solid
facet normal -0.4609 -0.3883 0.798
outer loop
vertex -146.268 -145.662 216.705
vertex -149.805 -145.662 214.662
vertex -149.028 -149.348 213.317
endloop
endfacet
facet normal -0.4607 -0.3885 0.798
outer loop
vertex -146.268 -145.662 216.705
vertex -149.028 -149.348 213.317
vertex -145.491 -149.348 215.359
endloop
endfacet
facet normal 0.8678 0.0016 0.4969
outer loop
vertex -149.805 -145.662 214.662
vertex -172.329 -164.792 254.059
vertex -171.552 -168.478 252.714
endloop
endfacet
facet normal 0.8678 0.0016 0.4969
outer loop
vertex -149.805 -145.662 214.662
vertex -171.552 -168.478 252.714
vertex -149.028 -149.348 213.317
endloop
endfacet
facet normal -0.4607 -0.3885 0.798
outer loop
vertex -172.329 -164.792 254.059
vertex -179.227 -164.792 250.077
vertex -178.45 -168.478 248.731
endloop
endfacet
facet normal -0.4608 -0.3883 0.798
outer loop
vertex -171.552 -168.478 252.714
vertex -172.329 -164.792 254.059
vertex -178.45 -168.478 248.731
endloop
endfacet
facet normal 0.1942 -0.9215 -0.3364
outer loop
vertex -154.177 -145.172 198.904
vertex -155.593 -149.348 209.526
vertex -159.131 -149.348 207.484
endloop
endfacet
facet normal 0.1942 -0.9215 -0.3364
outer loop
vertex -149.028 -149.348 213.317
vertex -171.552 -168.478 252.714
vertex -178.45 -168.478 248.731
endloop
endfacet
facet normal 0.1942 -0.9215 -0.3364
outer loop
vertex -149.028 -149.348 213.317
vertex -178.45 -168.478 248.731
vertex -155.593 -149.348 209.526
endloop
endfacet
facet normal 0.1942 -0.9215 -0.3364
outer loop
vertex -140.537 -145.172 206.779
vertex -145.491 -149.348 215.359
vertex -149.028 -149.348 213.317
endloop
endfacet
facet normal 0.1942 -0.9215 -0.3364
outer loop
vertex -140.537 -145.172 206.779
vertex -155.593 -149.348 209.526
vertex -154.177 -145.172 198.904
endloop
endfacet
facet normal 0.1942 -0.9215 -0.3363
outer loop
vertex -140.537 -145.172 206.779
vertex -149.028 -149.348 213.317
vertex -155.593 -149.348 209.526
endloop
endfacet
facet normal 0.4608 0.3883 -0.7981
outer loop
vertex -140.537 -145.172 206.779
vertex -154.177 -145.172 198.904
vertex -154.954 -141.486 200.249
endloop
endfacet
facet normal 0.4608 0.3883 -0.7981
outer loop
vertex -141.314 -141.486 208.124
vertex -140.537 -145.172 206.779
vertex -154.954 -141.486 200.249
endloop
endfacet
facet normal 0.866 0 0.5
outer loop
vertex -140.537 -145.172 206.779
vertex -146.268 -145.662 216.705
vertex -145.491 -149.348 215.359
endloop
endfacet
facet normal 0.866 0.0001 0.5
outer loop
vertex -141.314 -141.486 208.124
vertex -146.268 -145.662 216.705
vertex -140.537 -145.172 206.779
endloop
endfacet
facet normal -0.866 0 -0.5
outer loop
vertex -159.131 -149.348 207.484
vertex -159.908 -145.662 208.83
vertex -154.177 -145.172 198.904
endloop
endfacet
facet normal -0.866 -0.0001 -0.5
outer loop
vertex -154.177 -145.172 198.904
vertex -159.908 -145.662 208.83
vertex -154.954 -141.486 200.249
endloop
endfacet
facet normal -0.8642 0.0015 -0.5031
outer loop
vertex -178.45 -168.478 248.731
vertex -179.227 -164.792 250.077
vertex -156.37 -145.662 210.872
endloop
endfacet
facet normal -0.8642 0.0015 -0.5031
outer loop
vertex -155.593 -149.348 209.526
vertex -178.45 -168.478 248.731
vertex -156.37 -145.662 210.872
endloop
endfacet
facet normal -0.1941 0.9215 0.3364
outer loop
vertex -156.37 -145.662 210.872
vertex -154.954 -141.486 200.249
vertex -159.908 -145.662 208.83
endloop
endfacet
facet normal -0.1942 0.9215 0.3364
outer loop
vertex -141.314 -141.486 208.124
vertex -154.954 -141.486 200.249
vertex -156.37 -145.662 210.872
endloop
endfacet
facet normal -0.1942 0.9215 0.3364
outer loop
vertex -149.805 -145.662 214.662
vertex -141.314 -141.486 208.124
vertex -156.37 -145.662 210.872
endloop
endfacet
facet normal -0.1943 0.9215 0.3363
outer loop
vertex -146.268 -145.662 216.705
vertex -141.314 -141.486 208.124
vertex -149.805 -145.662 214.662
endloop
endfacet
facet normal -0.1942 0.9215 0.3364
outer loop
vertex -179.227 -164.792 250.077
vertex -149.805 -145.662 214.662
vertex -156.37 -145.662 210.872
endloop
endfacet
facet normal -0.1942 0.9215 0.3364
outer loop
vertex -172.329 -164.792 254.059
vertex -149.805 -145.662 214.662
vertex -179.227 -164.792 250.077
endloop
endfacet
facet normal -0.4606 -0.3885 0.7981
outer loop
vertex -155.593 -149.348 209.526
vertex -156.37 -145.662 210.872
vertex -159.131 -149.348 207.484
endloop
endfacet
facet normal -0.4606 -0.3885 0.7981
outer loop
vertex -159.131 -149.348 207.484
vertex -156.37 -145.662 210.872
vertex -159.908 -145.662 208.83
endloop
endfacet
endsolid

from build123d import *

# Parameters (mm, degrees)
BOSS_EXTRUDE1_DEPTH = 15.75
CUT_EXTRUDE1_DEPTH  = 29.12540638


with BuildPart() as part:
    # Sketch1 → Boss-Extrude1 (new body)
    with BuildSketch(Plane(origin=(-15.864839006, 0, -9.159569071), x_dir=(0.5, 0, -0.866025404), z_dir=(0.866025404, 0, 0.5))):
        Polygon((-250.897888289, -141.485825414), (-306.1863183, -164.792251717), (-304.632556546, -168.478147051), (-249.344126536, -145.171720748), align=None)
    extrude(amount=-BOSS_EXTRUDE1_DEPTH)

    # Sketch2 → Cut-Extrude1 (cut, through all)
    with BuildSketch(Plane(origin=(6.393069309, -30.331785785, -11.073120859), x_dir=(0.980957953, 0.182442937, 0.066603816), z_dir=(-0.194220219, 0.921473834, 0.336399287))):
        Polygon((-192.659600657, -289.596321832), (-189.22286398, -291.424710992), (-165.922780405, -248.036843291), (-175.386750656, -243.001886517), (-198.517574459, -286.479802644), align=None)
        Polygon((-149.766129503, -256.632394287), (-172.896953306, -300.110310414), (-178.754927107, -296.993791227), (-182.191663785, -295.165402067), (-159.230099754, -251.597437512), align=None)
    extrude(amount=-CUT_EXTRUDE1_DEPTH, mode=Mode.SUBTRACT)


solid = part.part
